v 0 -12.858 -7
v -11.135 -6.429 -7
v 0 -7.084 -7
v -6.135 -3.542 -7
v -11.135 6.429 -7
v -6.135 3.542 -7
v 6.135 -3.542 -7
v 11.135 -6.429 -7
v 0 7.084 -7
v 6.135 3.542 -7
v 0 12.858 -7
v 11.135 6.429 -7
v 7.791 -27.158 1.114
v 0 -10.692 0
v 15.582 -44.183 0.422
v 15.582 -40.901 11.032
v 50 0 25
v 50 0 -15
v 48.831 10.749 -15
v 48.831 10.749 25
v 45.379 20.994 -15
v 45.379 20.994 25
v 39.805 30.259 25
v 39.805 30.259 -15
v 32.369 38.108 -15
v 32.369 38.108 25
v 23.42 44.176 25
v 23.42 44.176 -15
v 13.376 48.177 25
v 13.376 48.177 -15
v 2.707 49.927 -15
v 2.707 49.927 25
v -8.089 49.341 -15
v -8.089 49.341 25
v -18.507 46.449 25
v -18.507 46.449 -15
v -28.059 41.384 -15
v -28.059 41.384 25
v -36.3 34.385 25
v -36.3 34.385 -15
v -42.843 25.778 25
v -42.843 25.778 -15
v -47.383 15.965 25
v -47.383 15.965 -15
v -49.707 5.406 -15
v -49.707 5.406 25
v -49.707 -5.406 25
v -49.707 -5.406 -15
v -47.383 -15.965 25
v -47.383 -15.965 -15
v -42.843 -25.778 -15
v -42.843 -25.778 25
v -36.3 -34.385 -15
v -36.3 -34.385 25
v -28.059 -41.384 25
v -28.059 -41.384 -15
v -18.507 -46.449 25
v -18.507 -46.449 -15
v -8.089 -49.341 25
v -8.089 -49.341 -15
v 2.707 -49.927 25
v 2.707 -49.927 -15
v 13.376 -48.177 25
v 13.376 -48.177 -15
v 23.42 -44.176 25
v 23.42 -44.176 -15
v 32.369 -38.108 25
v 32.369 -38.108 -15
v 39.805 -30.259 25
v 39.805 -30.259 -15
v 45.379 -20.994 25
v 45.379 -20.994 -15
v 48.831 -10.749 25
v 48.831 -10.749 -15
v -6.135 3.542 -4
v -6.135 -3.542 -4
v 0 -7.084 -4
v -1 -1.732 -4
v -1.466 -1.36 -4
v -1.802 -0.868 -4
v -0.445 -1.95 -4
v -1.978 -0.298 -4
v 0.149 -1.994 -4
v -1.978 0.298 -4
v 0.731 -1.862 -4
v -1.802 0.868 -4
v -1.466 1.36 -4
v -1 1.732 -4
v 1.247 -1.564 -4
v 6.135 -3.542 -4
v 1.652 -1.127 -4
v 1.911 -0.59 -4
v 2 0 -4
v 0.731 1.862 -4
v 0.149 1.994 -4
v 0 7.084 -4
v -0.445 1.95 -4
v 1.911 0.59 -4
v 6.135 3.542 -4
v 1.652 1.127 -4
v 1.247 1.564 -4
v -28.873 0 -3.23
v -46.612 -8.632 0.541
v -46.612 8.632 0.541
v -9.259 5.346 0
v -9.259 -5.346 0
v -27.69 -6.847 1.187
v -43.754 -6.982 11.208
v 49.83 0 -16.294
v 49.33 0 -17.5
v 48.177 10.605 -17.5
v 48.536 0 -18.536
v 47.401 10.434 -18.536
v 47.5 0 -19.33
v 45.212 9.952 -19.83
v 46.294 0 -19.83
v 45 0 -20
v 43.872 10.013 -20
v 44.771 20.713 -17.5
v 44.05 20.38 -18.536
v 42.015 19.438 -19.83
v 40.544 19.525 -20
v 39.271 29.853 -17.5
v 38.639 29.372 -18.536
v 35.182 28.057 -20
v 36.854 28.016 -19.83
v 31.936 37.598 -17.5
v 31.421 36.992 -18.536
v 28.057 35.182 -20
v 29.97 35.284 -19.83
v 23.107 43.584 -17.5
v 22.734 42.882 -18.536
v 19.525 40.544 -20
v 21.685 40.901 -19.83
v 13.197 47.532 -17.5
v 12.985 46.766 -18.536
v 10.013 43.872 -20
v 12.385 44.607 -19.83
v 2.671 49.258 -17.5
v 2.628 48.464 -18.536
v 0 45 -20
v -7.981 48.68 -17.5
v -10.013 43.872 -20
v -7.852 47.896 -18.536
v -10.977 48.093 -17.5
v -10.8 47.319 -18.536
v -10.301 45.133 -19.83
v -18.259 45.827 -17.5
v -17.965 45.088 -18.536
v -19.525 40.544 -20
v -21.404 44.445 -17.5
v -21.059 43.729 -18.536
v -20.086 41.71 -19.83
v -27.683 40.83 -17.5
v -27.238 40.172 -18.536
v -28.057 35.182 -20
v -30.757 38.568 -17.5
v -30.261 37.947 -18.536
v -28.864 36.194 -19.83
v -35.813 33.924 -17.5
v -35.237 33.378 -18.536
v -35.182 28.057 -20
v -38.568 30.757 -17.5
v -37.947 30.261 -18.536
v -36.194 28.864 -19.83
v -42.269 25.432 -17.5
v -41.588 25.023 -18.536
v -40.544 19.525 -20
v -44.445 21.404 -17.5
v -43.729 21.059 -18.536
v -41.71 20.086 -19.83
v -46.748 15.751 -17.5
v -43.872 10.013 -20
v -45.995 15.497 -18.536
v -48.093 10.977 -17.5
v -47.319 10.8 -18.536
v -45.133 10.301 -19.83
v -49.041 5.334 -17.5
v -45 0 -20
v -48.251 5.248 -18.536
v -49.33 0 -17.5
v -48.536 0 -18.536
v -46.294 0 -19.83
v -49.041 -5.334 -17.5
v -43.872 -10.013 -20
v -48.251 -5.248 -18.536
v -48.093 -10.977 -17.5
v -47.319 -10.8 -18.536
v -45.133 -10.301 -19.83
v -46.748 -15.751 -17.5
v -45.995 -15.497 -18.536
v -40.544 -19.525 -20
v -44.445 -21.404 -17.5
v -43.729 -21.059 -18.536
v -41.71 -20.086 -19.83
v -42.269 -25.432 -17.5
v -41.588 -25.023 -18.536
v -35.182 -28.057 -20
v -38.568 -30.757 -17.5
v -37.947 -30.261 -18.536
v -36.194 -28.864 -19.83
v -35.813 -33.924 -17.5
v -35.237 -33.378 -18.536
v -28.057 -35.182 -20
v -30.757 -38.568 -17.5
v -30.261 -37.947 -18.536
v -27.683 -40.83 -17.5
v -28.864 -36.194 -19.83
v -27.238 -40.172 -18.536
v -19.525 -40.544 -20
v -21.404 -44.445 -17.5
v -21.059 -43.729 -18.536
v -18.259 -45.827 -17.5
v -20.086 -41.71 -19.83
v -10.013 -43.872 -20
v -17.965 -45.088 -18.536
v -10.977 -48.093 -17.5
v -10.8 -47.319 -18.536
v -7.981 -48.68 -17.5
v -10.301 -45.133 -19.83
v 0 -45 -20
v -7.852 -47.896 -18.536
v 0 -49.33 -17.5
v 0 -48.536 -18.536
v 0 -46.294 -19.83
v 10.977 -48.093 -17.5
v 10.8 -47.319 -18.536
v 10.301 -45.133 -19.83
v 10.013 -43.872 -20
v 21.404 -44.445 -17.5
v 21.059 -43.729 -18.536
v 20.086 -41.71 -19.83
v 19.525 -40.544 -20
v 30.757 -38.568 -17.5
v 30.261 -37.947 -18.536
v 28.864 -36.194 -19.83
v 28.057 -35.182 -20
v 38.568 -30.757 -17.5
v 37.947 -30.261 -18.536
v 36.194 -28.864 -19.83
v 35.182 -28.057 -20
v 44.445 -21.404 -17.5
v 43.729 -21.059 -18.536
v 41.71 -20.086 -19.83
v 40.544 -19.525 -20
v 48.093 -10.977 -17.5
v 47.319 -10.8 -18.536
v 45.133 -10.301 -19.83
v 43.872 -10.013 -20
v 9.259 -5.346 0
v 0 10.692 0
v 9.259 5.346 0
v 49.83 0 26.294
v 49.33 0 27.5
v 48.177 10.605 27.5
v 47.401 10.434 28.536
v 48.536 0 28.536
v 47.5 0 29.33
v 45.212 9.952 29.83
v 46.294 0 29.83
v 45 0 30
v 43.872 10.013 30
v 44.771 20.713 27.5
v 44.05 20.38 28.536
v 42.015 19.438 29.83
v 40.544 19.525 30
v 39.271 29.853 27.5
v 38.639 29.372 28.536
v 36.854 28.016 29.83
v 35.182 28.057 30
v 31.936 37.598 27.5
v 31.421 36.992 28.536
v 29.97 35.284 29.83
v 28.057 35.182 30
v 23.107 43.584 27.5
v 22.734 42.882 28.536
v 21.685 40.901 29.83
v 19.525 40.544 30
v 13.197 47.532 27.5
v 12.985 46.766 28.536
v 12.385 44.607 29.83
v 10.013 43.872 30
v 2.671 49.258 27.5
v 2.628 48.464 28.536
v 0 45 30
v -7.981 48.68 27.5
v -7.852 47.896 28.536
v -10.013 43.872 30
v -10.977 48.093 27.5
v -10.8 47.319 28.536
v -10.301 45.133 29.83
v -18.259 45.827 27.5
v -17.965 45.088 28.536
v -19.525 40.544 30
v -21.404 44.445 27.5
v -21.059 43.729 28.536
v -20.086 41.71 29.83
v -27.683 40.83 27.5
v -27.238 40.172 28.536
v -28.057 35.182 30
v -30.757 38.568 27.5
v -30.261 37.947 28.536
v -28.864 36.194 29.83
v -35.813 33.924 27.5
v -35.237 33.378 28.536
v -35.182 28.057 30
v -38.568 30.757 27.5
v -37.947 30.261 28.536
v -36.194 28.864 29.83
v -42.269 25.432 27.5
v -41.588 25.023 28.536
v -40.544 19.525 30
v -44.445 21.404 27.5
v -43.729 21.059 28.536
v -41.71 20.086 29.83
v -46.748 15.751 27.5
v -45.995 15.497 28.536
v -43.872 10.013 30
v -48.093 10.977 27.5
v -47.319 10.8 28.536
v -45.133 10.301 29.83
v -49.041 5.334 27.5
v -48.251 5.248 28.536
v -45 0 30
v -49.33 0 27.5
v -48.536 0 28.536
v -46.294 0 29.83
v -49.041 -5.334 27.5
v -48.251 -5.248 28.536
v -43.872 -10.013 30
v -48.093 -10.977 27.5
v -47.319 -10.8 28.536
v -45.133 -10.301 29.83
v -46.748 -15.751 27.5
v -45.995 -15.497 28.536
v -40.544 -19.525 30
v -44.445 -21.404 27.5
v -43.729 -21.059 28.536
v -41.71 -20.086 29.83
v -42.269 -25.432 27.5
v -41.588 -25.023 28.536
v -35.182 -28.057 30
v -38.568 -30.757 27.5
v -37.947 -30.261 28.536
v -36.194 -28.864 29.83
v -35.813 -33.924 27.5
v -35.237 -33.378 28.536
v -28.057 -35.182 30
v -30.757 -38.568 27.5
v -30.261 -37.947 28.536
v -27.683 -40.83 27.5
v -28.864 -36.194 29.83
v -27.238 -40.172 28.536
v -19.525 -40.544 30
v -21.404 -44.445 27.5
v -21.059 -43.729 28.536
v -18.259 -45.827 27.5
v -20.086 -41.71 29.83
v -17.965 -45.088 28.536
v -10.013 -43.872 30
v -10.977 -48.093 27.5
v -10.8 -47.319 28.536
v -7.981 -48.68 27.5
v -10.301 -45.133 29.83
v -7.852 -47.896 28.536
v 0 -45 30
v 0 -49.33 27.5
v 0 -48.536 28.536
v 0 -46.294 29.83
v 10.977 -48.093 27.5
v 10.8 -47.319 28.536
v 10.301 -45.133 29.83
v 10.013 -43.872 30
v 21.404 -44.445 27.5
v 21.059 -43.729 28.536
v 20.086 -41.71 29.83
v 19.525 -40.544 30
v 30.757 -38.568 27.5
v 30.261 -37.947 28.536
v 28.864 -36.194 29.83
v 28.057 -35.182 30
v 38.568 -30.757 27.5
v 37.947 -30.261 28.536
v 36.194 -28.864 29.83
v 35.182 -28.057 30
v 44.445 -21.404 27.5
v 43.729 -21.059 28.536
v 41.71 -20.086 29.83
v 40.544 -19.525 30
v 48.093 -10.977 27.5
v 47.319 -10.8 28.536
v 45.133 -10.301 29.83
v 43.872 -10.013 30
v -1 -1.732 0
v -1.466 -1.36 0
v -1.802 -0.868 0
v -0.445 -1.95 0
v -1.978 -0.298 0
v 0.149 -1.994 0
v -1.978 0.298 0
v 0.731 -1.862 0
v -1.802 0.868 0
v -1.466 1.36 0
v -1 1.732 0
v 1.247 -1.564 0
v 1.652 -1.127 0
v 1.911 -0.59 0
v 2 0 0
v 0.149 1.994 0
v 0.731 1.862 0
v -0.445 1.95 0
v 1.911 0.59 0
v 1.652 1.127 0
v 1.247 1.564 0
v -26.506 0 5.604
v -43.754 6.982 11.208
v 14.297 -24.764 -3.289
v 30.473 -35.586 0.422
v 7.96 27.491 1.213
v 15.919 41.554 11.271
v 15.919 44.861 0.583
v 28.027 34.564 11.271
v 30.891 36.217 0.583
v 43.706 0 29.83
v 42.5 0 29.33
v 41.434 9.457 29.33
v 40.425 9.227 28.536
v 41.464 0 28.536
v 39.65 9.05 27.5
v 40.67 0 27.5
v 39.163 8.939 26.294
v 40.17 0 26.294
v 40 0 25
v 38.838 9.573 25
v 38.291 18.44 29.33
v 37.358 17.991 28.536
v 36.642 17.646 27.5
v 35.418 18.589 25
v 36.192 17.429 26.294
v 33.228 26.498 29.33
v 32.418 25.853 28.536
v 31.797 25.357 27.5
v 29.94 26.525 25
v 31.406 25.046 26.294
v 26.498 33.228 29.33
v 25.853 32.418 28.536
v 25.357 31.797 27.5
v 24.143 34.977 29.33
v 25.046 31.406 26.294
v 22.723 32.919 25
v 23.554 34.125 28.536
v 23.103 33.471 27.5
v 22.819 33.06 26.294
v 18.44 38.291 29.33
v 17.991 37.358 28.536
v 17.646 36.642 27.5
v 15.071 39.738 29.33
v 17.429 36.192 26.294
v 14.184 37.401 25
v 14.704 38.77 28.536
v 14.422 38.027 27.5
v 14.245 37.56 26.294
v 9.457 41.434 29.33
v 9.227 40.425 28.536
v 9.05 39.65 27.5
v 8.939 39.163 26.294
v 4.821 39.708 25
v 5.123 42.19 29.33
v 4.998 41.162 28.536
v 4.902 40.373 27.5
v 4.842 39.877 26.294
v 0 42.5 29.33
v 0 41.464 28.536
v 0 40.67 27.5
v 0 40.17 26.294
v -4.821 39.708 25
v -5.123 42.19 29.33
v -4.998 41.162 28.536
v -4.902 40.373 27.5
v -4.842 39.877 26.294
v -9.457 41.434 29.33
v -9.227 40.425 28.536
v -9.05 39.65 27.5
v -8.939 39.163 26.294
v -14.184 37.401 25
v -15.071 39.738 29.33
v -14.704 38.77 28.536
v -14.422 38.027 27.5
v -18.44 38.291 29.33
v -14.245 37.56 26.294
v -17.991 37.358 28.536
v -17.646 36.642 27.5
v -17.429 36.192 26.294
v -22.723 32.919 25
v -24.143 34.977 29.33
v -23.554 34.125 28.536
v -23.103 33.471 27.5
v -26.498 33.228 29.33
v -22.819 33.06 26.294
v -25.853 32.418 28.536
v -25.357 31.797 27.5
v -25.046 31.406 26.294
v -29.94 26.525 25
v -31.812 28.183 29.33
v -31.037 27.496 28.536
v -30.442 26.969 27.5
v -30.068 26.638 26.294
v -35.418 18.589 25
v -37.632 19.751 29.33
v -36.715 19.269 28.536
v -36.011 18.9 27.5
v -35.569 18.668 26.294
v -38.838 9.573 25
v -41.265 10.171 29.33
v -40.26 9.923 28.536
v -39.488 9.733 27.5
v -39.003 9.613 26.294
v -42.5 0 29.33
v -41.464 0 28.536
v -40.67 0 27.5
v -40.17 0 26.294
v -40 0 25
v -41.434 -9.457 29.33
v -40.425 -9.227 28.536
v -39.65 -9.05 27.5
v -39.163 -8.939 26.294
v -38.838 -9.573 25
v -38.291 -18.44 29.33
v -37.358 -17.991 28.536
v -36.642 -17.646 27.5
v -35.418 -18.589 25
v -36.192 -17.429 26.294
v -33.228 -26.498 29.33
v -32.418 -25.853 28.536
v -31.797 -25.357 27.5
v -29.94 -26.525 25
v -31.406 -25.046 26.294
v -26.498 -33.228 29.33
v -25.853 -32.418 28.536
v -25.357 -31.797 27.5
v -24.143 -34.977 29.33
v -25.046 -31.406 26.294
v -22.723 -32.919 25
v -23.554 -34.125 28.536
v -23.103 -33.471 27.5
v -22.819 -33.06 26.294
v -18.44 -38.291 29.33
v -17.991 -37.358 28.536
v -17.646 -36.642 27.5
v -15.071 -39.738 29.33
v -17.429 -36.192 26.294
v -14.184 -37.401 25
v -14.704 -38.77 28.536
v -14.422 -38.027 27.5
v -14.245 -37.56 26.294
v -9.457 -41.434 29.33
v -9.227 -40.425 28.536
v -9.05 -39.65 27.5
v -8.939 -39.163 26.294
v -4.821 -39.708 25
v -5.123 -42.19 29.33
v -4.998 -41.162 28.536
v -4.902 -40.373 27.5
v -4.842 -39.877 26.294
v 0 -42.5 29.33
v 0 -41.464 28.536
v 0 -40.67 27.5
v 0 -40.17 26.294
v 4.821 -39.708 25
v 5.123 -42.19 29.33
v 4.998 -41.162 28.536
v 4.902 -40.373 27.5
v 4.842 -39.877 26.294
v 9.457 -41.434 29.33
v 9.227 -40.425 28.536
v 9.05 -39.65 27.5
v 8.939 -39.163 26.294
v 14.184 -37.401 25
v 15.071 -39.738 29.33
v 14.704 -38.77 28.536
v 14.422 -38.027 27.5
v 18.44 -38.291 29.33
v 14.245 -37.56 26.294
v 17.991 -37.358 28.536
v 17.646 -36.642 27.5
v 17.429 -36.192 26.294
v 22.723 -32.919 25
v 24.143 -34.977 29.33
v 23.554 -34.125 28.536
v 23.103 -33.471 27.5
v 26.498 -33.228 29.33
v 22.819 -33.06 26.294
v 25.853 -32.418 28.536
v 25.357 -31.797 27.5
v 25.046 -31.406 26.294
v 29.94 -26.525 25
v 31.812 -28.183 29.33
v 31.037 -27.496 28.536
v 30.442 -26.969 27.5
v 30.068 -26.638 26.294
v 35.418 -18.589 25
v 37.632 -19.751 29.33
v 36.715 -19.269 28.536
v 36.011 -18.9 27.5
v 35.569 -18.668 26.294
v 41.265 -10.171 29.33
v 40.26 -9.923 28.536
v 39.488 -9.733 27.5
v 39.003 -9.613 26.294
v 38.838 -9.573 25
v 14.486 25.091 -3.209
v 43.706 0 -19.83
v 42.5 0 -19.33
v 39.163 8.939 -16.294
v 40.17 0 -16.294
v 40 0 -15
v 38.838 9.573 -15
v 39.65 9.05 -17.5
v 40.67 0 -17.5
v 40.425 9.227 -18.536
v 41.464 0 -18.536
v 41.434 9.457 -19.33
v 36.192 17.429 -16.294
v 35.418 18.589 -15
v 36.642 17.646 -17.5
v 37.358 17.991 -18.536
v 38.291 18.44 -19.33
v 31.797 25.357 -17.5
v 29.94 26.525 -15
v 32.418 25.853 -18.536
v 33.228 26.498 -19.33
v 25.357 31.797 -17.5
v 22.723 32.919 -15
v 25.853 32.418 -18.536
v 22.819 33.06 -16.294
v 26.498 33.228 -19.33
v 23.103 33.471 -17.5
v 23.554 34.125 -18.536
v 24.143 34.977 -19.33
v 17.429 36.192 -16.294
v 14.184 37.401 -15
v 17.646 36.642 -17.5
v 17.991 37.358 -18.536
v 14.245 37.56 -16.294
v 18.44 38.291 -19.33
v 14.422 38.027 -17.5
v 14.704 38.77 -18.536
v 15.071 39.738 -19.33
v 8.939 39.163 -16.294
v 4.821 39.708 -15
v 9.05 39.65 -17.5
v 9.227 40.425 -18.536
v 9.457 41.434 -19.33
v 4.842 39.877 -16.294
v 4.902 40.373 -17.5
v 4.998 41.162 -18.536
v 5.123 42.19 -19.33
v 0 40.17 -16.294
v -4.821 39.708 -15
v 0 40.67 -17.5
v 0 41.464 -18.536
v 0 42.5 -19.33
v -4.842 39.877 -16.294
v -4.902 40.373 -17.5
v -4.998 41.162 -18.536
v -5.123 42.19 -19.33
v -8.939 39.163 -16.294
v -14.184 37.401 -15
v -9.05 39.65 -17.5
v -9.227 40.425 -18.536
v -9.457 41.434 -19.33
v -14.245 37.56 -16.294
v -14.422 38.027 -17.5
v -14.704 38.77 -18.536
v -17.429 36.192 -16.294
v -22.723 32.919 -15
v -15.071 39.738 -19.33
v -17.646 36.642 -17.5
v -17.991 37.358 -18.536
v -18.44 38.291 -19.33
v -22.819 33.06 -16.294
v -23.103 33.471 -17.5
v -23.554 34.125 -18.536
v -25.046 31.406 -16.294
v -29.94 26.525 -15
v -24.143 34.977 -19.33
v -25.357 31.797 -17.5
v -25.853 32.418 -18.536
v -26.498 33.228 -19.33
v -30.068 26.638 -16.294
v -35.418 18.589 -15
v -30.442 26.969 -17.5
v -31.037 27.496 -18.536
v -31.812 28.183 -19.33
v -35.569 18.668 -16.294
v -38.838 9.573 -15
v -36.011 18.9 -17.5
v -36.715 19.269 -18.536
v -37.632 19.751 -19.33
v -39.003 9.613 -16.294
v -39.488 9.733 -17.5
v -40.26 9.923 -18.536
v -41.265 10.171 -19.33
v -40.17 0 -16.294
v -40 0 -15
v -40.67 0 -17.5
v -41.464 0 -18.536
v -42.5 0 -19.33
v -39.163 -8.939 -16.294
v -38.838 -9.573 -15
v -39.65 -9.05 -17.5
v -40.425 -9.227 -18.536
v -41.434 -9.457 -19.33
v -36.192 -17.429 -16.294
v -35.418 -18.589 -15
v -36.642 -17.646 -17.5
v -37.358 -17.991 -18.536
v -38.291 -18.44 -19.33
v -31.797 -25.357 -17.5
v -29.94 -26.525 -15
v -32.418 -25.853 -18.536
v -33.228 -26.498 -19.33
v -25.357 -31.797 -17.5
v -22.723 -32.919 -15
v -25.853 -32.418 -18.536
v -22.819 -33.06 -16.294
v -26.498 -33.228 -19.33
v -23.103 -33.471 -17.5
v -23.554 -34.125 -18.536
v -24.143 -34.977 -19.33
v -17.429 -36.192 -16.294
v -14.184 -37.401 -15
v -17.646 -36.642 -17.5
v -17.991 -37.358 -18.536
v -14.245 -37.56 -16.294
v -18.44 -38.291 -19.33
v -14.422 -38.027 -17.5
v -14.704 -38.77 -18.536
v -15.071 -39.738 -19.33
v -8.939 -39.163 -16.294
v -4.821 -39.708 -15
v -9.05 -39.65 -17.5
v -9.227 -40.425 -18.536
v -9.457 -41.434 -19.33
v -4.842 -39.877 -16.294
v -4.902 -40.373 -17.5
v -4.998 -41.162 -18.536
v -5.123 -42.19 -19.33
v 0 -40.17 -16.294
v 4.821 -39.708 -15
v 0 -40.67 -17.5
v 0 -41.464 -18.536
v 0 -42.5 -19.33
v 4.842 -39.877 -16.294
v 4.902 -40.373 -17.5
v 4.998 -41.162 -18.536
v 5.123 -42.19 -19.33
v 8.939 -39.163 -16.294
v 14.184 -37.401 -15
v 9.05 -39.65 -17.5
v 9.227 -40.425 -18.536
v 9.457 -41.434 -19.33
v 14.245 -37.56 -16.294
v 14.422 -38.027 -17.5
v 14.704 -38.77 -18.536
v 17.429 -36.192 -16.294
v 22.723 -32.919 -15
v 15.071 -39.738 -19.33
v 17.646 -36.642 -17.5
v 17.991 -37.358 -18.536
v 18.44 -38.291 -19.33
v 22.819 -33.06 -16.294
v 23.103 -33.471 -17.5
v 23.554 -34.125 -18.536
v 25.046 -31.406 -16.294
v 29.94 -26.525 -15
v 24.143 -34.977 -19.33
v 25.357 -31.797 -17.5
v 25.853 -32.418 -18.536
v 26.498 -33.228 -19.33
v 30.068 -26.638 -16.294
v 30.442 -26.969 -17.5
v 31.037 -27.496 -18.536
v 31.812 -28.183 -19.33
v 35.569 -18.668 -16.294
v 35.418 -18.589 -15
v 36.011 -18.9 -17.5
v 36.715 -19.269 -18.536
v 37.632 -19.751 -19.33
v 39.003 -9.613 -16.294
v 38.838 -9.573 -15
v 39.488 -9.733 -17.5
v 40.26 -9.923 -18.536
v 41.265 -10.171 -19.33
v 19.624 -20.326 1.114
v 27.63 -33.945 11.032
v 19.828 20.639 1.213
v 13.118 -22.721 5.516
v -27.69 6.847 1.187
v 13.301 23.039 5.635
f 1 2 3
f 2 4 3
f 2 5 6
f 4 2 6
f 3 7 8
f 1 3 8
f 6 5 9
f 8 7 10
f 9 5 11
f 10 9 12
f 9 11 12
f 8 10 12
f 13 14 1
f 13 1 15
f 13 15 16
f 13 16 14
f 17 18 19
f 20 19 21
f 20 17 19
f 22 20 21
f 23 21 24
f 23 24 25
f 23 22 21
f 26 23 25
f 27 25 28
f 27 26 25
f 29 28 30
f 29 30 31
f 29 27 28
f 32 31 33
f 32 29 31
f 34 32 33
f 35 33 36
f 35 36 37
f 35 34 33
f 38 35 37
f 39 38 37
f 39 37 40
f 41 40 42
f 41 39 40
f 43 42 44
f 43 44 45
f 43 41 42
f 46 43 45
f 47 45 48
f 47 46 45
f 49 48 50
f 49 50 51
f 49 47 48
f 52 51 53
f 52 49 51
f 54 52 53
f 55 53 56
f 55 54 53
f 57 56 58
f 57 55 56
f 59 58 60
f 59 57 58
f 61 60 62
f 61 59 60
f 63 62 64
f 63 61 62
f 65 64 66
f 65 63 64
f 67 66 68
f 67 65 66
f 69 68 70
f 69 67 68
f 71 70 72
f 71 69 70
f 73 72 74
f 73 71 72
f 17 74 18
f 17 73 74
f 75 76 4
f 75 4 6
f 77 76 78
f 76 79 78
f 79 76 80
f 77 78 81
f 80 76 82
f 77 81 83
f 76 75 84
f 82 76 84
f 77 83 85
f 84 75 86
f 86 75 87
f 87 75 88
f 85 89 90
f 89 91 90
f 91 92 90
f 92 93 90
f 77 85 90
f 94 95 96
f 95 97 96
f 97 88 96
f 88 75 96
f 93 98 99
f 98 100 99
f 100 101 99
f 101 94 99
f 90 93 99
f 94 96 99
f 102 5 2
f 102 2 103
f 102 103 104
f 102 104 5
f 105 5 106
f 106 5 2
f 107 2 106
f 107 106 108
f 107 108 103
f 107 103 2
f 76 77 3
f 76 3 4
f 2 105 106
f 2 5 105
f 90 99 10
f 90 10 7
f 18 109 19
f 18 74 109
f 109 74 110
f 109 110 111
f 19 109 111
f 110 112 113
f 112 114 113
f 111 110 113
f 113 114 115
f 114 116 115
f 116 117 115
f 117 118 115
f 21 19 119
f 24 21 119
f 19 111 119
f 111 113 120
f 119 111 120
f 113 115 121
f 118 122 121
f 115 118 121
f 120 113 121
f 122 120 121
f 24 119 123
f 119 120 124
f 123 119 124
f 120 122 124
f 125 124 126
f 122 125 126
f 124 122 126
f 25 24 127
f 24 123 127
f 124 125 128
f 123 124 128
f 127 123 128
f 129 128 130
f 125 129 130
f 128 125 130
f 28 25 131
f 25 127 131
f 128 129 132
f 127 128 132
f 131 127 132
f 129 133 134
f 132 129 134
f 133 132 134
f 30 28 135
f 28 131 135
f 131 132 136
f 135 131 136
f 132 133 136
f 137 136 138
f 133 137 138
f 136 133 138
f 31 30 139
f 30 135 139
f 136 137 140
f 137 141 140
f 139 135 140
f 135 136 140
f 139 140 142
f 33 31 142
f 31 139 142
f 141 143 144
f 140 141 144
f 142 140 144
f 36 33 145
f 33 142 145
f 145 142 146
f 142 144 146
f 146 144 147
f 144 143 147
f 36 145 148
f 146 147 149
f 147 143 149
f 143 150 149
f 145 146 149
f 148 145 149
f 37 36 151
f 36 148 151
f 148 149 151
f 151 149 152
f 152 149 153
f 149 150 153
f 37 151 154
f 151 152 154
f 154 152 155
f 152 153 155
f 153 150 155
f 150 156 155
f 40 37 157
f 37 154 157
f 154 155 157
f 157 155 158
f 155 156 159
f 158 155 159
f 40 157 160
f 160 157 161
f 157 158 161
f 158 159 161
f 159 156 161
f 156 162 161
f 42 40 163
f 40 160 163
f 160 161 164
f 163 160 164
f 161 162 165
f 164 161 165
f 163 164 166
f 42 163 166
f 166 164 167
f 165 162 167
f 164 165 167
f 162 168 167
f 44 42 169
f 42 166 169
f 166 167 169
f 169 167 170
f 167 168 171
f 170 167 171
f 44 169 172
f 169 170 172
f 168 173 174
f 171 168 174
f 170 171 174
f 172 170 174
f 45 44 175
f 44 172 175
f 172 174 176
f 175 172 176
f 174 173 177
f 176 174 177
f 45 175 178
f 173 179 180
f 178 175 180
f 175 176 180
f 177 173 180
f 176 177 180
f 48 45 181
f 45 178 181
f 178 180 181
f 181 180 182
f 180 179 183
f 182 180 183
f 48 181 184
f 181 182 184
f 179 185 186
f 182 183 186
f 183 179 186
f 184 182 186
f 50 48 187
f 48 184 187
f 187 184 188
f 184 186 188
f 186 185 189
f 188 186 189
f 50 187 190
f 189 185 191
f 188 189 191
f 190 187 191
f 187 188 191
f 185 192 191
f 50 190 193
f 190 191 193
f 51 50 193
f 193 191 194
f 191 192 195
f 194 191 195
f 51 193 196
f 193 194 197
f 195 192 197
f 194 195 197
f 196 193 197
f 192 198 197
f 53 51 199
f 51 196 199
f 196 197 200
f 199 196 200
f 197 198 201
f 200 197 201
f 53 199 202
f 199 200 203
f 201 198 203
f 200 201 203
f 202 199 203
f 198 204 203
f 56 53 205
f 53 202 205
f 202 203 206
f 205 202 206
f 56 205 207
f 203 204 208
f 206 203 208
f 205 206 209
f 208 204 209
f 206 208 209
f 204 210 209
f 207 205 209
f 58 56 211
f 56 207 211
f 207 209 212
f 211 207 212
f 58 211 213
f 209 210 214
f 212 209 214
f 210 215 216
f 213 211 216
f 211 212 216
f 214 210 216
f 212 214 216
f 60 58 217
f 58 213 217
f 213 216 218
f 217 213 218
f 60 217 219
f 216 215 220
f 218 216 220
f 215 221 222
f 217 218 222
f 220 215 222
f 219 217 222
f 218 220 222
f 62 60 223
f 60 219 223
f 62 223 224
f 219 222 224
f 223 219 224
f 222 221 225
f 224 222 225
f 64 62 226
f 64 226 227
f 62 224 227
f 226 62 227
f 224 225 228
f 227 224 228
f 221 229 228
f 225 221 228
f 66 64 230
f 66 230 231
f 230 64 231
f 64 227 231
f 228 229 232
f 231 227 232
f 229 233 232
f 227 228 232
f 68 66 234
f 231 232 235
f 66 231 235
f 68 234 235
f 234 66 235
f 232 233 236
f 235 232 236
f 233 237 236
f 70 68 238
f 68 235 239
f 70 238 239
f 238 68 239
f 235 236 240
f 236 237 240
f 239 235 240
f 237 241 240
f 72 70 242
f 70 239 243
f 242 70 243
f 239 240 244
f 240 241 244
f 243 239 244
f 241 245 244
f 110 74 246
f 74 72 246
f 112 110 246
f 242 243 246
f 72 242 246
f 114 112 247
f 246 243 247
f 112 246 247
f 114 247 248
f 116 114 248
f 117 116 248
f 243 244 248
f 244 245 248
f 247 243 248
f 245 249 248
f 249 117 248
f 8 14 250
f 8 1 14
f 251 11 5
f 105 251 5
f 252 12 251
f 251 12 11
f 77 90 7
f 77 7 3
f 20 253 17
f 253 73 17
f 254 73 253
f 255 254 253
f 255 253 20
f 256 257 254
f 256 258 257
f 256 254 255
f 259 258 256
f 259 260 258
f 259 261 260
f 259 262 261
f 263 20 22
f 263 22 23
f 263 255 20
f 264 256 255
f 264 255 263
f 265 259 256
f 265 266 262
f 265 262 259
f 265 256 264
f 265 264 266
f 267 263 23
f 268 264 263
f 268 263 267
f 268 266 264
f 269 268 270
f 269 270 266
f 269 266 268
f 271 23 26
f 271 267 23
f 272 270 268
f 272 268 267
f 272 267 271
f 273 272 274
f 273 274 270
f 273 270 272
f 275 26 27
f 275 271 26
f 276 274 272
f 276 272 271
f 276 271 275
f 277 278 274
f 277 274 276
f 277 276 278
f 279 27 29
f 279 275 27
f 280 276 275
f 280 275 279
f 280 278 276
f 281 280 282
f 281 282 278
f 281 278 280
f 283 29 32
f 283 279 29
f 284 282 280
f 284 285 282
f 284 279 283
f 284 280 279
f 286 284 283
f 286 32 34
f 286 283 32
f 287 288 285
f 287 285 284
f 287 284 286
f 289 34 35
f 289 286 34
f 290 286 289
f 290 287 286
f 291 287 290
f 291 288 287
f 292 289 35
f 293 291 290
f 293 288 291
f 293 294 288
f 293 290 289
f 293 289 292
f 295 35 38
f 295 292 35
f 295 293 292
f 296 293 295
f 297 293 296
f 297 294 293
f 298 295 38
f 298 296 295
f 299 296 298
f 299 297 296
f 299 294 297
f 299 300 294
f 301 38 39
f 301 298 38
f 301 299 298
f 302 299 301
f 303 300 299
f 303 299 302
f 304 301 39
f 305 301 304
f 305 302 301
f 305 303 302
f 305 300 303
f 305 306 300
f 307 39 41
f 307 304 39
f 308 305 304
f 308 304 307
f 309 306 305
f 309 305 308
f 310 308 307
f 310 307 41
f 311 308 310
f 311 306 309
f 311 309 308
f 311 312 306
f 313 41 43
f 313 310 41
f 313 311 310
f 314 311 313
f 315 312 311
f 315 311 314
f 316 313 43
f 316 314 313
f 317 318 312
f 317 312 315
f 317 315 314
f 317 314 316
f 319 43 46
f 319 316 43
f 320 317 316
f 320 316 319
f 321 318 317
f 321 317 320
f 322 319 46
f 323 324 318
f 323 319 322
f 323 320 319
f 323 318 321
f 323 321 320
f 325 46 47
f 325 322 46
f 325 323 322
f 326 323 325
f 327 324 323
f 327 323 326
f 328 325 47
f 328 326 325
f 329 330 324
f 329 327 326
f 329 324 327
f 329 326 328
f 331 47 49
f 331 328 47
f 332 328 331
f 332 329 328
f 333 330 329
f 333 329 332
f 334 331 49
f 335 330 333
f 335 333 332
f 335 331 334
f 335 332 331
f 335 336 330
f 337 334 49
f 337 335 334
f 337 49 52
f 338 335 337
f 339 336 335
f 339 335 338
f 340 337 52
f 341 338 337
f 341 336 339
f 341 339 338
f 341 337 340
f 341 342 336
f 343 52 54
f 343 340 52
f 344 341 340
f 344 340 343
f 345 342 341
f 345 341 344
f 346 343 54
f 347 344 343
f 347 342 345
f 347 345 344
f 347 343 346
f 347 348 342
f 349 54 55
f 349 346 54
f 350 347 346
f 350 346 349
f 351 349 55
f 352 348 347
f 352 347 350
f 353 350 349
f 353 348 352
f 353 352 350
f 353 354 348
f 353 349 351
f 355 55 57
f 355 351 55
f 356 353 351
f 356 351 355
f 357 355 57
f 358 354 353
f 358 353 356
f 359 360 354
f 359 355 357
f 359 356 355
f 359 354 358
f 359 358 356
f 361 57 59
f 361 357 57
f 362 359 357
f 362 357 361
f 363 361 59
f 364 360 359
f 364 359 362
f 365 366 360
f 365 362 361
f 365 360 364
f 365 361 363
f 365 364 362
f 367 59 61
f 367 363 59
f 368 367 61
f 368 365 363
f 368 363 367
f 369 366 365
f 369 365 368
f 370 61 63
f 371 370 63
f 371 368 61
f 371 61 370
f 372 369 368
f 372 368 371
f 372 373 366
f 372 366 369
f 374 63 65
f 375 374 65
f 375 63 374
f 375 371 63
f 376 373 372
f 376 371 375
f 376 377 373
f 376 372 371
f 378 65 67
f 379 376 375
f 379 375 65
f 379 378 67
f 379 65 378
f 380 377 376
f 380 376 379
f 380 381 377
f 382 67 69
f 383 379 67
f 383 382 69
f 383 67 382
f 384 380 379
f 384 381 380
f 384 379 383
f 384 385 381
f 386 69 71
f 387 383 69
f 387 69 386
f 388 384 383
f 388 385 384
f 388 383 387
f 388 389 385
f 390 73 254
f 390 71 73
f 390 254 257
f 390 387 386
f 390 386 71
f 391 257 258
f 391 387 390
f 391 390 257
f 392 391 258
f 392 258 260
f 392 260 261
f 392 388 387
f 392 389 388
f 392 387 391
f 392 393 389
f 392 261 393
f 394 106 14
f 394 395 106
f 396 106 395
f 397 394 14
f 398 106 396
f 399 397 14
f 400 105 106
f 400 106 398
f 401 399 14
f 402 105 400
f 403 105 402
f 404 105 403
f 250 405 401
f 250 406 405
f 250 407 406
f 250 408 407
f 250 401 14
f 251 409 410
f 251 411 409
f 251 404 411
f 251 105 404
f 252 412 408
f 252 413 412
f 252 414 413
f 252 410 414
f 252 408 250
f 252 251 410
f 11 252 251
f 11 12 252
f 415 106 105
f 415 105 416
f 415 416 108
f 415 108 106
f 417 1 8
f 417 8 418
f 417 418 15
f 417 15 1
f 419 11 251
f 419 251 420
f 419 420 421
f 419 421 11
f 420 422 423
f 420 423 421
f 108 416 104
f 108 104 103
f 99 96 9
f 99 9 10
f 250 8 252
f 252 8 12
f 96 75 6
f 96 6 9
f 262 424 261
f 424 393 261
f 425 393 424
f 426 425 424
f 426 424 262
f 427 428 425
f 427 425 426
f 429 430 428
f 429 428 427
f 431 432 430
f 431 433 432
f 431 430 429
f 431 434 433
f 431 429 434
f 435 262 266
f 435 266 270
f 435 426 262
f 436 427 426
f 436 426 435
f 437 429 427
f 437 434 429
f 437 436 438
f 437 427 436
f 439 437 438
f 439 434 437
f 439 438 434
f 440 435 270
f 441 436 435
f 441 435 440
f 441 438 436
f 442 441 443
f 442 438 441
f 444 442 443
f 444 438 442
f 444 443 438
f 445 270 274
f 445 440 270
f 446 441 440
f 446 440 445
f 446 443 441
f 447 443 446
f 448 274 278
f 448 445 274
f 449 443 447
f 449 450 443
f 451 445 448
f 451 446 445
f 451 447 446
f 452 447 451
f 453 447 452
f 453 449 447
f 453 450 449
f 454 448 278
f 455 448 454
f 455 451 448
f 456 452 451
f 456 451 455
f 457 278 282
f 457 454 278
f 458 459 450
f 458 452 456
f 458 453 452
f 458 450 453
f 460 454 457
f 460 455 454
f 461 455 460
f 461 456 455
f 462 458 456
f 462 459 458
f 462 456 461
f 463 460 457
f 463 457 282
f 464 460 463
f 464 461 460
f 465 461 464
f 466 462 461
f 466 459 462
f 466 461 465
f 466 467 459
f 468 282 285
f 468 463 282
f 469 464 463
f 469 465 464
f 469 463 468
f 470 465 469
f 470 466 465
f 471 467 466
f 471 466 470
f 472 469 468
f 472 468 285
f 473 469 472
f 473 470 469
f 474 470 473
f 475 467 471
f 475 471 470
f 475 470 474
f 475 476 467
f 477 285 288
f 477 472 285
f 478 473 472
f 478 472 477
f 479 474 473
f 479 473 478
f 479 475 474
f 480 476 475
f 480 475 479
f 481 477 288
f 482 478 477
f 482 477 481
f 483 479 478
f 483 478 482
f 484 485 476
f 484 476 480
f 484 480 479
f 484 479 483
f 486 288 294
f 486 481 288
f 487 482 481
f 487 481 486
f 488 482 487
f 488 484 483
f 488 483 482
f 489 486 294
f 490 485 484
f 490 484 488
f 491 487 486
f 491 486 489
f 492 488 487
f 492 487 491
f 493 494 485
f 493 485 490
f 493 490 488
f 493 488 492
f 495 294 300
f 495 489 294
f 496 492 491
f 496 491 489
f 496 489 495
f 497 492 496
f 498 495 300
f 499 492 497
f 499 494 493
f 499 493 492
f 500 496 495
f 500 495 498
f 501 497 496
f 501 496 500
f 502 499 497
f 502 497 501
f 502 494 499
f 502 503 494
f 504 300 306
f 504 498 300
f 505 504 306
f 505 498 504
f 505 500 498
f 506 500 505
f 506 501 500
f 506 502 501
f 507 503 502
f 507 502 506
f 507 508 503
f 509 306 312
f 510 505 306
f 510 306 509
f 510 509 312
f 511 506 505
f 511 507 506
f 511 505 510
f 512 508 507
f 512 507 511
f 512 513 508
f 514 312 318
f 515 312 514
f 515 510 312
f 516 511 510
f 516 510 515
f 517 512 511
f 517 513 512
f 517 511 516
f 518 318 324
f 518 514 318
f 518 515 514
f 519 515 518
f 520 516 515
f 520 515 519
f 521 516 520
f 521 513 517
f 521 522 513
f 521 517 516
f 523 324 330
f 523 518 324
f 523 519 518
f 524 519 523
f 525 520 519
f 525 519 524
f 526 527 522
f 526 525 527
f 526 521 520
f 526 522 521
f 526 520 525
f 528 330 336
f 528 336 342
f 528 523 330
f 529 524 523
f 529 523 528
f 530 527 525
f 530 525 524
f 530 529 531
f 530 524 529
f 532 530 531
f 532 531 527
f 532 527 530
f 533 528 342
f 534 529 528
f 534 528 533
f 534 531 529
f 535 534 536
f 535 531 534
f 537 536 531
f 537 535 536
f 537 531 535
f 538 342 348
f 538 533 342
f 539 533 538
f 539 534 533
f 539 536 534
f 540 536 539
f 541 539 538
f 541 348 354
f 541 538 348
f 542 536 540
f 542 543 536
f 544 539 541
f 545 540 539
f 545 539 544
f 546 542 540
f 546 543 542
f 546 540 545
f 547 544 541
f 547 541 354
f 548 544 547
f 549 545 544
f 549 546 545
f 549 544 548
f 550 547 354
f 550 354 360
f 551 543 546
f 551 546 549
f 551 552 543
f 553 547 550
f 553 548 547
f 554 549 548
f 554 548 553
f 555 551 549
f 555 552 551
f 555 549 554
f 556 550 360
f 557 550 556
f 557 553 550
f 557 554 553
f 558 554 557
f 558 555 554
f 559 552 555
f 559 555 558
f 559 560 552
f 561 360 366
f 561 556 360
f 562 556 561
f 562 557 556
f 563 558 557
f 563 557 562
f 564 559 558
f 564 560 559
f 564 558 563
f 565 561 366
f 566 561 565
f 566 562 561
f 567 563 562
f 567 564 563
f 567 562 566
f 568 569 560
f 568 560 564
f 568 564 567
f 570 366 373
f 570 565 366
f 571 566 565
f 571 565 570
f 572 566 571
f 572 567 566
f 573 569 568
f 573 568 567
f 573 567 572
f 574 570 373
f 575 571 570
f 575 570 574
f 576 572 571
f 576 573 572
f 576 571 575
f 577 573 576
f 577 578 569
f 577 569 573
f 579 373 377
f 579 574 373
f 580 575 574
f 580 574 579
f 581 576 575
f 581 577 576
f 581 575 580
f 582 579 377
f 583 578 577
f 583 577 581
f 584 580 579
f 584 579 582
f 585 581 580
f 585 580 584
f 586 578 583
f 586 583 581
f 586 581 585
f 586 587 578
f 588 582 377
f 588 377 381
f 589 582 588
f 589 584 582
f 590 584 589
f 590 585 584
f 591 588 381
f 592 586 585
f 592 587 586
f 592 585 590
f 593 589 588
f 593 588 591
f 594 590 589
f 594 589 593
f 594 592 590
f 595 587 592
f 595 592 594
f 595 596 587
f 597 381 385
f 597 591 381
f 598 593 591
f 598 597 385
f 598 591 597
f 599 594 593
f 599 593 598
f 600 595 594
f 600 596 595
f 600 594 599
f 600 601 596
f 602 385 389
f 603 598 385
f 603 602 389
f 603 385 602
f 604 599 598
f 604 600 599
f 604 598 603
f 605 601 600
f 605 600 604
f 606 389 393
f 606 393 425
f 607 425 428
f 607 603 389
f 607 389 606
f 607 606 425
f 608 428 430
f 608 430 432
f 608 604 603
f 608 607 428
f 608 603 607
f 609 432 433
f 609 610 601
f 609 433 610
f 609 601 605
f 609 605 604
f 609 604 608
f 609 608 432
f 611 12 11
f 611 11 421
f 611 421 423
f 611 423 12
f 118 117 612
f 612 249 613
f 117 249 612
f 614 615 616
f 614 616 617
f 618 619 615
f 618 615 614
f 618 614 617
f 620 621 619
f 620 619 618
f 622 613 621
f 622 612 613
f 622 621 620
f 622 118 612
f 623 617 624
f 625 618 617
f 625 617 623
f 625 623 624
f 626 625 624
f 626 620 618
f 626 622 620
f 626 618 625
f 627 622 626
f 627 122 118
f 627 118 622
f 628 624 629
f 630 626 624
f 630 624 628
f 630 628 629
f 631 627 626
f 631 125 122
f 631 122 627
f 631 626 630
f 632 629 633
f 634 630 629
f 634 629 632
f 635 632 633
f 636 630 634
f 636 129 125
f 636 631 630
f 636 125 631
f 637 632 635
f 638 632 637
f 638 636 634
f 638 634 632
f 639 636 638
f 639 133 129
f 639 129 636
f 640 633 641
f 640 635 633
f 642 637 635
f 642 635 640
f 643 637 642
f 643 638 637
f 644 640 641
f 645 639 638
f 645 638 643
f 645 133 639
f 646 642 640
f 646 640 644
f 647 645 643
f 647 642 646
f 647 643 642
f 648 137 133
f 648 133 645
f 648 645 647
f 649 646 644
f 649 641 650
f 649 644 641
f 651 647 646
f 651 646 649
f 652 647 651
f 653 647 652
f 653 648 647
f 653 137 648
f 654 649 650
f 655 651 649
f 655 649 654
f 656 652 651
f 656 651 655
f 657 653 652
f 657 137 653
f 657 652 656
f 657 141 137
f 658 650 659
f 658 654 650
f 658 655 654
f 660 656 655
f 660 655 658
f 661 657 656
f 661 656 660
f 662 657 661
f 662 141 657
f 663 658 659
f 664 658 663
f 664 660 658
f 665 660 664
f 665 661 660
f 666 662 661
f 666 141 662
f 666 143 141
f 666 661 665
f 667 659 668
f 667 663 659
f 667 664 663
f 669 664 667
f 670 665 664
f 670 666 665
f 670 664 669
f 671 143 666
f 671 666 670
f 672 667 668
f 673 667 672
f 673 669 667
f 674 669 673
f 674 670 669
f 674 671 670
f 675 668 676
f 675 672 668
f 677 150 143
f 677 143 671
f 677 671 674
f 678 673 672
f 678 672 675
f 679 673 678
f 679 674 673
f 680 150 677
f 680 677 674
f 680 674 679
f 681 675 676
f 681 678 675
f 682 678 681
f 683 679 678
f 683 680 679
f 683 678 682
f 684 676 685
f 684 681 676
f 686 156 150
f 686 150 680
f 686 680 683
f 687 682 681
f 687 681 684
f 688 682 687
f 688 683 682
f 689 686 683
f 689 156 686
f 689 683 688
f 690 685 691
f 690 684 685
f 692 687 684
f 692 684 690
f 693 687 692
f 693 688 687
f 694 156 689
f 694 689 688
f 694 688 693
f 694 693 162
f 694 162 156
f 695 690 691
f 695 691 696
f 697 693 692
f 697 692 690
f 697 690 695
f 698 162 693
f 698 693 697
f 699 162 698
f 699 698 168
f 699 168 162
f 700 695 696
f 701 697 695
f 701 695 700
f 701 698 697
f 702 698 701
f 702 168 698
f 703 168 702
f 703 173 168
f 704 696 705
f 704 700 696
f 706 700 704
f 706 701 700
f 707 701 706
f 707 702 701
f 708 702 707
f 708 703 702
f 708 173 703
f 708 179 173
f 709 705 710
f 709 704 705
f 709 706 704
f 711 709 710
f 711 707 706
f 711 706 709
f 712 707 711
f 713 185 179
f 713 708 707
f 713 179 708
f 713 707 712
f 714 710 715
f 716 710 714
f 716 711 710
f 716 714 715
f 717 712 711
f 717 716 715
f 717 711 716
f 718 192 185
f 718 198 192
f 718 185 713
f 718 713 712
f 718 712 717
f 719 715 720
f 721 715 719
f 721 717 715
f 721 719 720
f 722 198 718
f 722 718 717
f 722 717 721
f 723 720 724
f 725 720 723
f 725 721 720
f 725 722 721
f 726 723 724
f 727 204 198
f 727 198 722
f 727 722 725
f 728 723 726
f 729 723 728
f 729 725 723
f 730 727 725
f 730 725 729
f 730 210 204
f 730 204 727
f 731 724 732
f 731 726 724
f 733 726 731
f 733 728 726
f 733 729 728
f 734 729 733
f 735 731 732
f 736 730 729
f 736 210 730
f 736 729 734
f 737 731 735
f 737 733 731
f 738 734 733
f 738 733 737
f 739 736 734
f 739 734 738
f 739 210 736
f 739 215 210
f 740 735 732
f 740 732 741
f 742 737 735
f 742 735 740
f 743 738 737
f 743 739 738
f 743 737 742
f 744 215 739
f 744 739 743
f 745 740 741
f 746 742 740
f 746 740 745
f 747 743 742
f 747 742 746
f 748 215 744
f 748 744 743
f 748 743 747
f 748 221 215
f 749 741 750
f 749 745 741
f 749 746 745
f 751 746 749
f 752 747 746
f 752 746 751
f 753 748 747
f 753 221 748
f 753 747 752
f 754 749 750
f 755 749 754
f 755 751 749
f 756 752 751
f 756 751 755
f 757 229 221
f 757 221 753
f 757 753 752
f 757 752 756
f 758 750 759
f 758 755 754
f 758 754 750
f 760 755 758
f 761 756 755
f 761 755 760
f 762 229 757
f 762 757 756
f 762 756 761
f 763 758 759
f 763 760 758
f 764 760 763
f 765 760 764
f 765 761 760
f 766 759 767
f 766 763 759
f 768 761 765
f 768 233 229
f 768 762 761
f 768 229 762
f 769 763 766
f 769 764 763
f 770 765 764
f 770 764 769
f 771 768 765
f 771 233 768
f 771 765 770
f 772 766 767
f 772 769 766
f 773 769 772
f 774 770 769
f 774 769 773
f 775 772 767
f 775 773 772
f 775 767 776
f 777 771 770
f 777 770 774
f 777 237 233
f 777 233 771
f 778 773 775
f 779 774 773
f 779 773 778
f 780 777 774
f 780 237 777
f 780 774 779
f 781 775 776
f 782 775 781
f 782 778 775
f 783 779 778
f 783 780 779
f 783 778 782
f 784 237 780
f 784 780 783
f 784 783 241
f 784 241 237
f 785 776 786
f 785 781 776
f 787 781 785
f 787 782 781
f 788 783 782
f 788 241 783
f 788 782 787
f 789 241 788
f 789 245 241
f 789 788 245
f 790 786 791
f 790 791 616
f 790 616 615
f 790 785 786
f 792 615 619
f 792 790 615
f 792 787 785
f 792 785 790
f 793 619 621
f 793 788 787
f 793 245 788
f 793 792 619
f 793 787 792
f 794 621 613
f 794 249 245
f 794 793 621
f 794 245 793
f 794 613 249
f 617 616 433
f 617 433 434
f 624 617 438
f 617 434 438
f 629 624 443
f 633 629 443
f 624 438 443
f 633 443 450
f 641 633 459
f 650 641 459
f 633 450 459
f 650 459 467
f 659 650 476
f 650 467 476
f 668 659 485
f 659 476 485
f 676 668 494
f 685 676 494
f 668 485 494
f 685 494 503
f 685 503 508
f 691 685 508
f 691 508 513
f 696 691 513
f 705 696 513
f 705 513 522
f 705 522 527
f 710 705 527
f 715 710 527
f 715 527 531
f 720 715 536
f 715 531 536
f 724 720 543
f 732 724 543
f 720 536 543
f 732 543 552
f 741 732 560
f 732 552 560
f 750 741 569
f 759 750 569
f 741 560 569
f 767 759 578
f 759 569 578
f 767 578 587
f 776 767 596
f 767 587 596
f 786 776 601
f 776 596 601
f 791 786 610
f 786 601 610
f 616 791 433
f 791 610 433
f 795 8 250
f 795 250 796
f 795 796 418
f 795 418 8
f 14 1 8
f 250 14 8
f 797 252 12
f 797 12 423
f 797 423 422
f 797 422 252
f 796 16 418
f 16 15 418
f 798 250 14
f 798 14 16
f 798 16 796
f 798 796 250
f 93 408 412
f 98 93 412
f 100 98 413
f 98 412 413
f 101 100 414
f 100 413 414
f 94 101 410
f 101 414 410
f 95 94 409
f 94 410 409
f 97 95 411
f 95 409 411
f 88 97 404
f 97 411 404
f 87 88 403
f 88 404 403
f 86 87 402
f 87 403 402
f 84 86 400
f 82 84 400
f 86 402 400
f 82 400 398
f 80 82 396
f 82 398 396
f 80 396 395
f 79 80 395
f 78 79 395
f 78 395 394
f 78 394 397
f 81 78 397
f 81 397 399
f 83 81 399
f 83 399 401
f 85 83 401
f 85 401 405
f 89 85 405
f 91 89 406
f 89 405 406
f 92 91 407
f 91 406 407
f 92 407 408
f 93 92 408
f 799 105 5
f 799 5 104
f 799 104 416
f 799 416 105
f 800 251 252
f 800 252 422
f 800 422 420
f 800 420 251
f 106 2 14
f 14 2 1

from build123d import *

# Parameters (mm, degrees)
F2_R      = 50
F2_R_2    = 40
F3_DEPTH  = 50
F0_R      = 5.0478433235
F4_DEPTH  = 4
F5_DEPTH  = 7
F0_R_2    = 2
F6_DEPTH  = 58.6
F7_R      = 4.99999
F8_R      = 4.99999
F9_DEPTH  = 4
F10_SIZE2 = 6.99999
F10_SIZE  = 1.875634
F11_DEPTH = 36.4222936332
F11_TAPER = -3
F12_DEPTH = 35.6510207057
F12_TAPER = -3
F13_DEPTH = 36.2196154892
F13_TAPER = -3


# Not quite as in the source:
# - a fillet or chamfer is up to 0.001 mm smaller than in the source, because OpenCascade refuses the exact size


with BuildPart() as f3:
    # F2 (on offset) → F3 (new body)
    with BuildSketch(Plane.XY.offset(30)):
        Circle(F2_R)
        Circle(F2_R_2, mode=Mode.SUBTRACT)
    extrude(amount=-F3_DEPTH)

    # F0 (on Top) → F6 (cut)
    with BuildSketch(Plane.XY):
        Circle(F0_R_2)
    extrude(amount=F6_DEPTH, mode=Mode.SUBTRACT)

    # F7 (radius 5 in the source; OpenCascade refuses exactly that, so slightly less here)
    f7_edges = [f3.edges().sort_by_distance(p)[0] for p in [
        (-40, 0, -20),
        (-50, 0, -20),
    ]]
    fillet(f7_edges, radius=F7_R)

    # F8 (radius 5 in the source; OpenCascade refuses exactly that, so slightly less here)
    f8_edges = [f3.edges().sort_by_distance(p)[0] for p in [
        (-40, 0, 30),
        (-50, 0, 30),
    ]]
    fillet(f8_edges, radius=F8_R)


with BuildPart() as f4:
    # F0 (on Top) → F4 (new body)
    with BuildSketch(Plane.XY):
        Polygon((6.135, -3.5420439015), (6.135, 3.5420439015), (0, 7.084087803), (-6.135, 3.5420439015), (-6.135, -3.5420439015), (0, -7.084087803), align=None)
        Circle(F0_R, mode=Mode.SUBTRACT)
    extrude(amount=-F4_DEPTH)

    # F0 (on Top) → F5 (join)
    with BuildSketch(Plane.XY):
        Polygon((11.135, -6.4287952474), (11.135, 6.4287952474), (0, 12.8575904949), (-11.135, 6.4287952474), (-11.135, -6.4287952474), (0, -12.8575904949), align=None)
        Polygon((0, 7.084087803), (6.135, 3.5420439015), (6.135, -3.5420439015), (0, -7.084087803), (-6.135, -3.5420439015), (-6.135, 3.5420439015), align=None, mode=Mode.SUBTRACT)
    extrude(amount=-F5_DEPTH)

    # F0 (on Top) → F9 (join)
    with BuildSketch(Plane.XY):
        Circle(F0_R)
        Circle(F0_R_2, mode=Mode.SUBTRACT)
    extrude(amount=-F9_DEPTH)

    # F10 (size 1.875644347 and 7 in the source; OpenCascade refuses exactly that, so slightly less here)
    f10_edges = [f4.edges().sort_by_distance(p)[0] for p in [
        (-5.5675, -9.643193, 0),
        (5.5675, 9.643193, 0),
        (11.135, 0, 0),
        (-11.135, 0, 0),
        (-5.5675, 9.643193, 0),
        (5.5675, -9.643193, 0),
    ]]
    f10_side = f4.faces().sort_by_distance((5.39741, -9.348588, 0))[0]
    chamfer(f10_edges, length=F10_SIZE, length2=F10_SIZE2, reference=f10_side)


with BuildPart() as f11:
    # F10_face (on face) → F11 (new body)
    with BuildSketch(Plane(origin=(5.1129663969, 8.8559175768, -3.6072911298), x_dir=(-0.8660254038, 0.5, 0), z_dir=(0.4829630454, 0.8365165328, 0.2588180579))):
        Polygon((-5.3458974526, 3.7345415598), (-6.4287952474, -3.5123793658), (6.4287952474, -3.5123793658), (5.3458974526, 3.7345415598), align=None)
    extrude(amount=F11_DEPTH, taper=F11_TAPER)


with BuildPart() as f12:
    # F10_face1 (on face) → F12 (new body)
    with BuildSketch(Plane(origin=(5.1129663969, -8.8559175768, -3.6072911298), x_dir=(0.8660254038, 0.5, 0), z_dir=(0.4829630454, -0.8365165328, 0.2588180579))):
        Polygon((-5.3458974526, 3.7345415598), (-6.4287952474, -3.5123793658), (6.4287952474, -3.5123793658), (5.3458974526, 3.7345415598), align=None)
    extrude(amount=F12_DEPTH, taper=F12_TAPER)


with BuildPart() as f13:
    # F10_face2 (on face) → F13 (new body)
    with BuildSketch(Plane(origin=(-10.2259327938, 0, -3.6072911298), x_dir=(0, -1, 0), z_dir=(-0.9659260908, 0, 0.2588180579))):
        Polygon((-5.3458974526, 3.7345415598), (-6.4287952474, -3.5123793658), (6.4287952474, -3.5123793658), (5.3458974526, 3.7345415598), align=None)
    extrude(amount=F13_DEPTH, taper=F13_TAPER)


solid = Compound([f3.part, f4.part, f11.part, f12.part, f13.part])
